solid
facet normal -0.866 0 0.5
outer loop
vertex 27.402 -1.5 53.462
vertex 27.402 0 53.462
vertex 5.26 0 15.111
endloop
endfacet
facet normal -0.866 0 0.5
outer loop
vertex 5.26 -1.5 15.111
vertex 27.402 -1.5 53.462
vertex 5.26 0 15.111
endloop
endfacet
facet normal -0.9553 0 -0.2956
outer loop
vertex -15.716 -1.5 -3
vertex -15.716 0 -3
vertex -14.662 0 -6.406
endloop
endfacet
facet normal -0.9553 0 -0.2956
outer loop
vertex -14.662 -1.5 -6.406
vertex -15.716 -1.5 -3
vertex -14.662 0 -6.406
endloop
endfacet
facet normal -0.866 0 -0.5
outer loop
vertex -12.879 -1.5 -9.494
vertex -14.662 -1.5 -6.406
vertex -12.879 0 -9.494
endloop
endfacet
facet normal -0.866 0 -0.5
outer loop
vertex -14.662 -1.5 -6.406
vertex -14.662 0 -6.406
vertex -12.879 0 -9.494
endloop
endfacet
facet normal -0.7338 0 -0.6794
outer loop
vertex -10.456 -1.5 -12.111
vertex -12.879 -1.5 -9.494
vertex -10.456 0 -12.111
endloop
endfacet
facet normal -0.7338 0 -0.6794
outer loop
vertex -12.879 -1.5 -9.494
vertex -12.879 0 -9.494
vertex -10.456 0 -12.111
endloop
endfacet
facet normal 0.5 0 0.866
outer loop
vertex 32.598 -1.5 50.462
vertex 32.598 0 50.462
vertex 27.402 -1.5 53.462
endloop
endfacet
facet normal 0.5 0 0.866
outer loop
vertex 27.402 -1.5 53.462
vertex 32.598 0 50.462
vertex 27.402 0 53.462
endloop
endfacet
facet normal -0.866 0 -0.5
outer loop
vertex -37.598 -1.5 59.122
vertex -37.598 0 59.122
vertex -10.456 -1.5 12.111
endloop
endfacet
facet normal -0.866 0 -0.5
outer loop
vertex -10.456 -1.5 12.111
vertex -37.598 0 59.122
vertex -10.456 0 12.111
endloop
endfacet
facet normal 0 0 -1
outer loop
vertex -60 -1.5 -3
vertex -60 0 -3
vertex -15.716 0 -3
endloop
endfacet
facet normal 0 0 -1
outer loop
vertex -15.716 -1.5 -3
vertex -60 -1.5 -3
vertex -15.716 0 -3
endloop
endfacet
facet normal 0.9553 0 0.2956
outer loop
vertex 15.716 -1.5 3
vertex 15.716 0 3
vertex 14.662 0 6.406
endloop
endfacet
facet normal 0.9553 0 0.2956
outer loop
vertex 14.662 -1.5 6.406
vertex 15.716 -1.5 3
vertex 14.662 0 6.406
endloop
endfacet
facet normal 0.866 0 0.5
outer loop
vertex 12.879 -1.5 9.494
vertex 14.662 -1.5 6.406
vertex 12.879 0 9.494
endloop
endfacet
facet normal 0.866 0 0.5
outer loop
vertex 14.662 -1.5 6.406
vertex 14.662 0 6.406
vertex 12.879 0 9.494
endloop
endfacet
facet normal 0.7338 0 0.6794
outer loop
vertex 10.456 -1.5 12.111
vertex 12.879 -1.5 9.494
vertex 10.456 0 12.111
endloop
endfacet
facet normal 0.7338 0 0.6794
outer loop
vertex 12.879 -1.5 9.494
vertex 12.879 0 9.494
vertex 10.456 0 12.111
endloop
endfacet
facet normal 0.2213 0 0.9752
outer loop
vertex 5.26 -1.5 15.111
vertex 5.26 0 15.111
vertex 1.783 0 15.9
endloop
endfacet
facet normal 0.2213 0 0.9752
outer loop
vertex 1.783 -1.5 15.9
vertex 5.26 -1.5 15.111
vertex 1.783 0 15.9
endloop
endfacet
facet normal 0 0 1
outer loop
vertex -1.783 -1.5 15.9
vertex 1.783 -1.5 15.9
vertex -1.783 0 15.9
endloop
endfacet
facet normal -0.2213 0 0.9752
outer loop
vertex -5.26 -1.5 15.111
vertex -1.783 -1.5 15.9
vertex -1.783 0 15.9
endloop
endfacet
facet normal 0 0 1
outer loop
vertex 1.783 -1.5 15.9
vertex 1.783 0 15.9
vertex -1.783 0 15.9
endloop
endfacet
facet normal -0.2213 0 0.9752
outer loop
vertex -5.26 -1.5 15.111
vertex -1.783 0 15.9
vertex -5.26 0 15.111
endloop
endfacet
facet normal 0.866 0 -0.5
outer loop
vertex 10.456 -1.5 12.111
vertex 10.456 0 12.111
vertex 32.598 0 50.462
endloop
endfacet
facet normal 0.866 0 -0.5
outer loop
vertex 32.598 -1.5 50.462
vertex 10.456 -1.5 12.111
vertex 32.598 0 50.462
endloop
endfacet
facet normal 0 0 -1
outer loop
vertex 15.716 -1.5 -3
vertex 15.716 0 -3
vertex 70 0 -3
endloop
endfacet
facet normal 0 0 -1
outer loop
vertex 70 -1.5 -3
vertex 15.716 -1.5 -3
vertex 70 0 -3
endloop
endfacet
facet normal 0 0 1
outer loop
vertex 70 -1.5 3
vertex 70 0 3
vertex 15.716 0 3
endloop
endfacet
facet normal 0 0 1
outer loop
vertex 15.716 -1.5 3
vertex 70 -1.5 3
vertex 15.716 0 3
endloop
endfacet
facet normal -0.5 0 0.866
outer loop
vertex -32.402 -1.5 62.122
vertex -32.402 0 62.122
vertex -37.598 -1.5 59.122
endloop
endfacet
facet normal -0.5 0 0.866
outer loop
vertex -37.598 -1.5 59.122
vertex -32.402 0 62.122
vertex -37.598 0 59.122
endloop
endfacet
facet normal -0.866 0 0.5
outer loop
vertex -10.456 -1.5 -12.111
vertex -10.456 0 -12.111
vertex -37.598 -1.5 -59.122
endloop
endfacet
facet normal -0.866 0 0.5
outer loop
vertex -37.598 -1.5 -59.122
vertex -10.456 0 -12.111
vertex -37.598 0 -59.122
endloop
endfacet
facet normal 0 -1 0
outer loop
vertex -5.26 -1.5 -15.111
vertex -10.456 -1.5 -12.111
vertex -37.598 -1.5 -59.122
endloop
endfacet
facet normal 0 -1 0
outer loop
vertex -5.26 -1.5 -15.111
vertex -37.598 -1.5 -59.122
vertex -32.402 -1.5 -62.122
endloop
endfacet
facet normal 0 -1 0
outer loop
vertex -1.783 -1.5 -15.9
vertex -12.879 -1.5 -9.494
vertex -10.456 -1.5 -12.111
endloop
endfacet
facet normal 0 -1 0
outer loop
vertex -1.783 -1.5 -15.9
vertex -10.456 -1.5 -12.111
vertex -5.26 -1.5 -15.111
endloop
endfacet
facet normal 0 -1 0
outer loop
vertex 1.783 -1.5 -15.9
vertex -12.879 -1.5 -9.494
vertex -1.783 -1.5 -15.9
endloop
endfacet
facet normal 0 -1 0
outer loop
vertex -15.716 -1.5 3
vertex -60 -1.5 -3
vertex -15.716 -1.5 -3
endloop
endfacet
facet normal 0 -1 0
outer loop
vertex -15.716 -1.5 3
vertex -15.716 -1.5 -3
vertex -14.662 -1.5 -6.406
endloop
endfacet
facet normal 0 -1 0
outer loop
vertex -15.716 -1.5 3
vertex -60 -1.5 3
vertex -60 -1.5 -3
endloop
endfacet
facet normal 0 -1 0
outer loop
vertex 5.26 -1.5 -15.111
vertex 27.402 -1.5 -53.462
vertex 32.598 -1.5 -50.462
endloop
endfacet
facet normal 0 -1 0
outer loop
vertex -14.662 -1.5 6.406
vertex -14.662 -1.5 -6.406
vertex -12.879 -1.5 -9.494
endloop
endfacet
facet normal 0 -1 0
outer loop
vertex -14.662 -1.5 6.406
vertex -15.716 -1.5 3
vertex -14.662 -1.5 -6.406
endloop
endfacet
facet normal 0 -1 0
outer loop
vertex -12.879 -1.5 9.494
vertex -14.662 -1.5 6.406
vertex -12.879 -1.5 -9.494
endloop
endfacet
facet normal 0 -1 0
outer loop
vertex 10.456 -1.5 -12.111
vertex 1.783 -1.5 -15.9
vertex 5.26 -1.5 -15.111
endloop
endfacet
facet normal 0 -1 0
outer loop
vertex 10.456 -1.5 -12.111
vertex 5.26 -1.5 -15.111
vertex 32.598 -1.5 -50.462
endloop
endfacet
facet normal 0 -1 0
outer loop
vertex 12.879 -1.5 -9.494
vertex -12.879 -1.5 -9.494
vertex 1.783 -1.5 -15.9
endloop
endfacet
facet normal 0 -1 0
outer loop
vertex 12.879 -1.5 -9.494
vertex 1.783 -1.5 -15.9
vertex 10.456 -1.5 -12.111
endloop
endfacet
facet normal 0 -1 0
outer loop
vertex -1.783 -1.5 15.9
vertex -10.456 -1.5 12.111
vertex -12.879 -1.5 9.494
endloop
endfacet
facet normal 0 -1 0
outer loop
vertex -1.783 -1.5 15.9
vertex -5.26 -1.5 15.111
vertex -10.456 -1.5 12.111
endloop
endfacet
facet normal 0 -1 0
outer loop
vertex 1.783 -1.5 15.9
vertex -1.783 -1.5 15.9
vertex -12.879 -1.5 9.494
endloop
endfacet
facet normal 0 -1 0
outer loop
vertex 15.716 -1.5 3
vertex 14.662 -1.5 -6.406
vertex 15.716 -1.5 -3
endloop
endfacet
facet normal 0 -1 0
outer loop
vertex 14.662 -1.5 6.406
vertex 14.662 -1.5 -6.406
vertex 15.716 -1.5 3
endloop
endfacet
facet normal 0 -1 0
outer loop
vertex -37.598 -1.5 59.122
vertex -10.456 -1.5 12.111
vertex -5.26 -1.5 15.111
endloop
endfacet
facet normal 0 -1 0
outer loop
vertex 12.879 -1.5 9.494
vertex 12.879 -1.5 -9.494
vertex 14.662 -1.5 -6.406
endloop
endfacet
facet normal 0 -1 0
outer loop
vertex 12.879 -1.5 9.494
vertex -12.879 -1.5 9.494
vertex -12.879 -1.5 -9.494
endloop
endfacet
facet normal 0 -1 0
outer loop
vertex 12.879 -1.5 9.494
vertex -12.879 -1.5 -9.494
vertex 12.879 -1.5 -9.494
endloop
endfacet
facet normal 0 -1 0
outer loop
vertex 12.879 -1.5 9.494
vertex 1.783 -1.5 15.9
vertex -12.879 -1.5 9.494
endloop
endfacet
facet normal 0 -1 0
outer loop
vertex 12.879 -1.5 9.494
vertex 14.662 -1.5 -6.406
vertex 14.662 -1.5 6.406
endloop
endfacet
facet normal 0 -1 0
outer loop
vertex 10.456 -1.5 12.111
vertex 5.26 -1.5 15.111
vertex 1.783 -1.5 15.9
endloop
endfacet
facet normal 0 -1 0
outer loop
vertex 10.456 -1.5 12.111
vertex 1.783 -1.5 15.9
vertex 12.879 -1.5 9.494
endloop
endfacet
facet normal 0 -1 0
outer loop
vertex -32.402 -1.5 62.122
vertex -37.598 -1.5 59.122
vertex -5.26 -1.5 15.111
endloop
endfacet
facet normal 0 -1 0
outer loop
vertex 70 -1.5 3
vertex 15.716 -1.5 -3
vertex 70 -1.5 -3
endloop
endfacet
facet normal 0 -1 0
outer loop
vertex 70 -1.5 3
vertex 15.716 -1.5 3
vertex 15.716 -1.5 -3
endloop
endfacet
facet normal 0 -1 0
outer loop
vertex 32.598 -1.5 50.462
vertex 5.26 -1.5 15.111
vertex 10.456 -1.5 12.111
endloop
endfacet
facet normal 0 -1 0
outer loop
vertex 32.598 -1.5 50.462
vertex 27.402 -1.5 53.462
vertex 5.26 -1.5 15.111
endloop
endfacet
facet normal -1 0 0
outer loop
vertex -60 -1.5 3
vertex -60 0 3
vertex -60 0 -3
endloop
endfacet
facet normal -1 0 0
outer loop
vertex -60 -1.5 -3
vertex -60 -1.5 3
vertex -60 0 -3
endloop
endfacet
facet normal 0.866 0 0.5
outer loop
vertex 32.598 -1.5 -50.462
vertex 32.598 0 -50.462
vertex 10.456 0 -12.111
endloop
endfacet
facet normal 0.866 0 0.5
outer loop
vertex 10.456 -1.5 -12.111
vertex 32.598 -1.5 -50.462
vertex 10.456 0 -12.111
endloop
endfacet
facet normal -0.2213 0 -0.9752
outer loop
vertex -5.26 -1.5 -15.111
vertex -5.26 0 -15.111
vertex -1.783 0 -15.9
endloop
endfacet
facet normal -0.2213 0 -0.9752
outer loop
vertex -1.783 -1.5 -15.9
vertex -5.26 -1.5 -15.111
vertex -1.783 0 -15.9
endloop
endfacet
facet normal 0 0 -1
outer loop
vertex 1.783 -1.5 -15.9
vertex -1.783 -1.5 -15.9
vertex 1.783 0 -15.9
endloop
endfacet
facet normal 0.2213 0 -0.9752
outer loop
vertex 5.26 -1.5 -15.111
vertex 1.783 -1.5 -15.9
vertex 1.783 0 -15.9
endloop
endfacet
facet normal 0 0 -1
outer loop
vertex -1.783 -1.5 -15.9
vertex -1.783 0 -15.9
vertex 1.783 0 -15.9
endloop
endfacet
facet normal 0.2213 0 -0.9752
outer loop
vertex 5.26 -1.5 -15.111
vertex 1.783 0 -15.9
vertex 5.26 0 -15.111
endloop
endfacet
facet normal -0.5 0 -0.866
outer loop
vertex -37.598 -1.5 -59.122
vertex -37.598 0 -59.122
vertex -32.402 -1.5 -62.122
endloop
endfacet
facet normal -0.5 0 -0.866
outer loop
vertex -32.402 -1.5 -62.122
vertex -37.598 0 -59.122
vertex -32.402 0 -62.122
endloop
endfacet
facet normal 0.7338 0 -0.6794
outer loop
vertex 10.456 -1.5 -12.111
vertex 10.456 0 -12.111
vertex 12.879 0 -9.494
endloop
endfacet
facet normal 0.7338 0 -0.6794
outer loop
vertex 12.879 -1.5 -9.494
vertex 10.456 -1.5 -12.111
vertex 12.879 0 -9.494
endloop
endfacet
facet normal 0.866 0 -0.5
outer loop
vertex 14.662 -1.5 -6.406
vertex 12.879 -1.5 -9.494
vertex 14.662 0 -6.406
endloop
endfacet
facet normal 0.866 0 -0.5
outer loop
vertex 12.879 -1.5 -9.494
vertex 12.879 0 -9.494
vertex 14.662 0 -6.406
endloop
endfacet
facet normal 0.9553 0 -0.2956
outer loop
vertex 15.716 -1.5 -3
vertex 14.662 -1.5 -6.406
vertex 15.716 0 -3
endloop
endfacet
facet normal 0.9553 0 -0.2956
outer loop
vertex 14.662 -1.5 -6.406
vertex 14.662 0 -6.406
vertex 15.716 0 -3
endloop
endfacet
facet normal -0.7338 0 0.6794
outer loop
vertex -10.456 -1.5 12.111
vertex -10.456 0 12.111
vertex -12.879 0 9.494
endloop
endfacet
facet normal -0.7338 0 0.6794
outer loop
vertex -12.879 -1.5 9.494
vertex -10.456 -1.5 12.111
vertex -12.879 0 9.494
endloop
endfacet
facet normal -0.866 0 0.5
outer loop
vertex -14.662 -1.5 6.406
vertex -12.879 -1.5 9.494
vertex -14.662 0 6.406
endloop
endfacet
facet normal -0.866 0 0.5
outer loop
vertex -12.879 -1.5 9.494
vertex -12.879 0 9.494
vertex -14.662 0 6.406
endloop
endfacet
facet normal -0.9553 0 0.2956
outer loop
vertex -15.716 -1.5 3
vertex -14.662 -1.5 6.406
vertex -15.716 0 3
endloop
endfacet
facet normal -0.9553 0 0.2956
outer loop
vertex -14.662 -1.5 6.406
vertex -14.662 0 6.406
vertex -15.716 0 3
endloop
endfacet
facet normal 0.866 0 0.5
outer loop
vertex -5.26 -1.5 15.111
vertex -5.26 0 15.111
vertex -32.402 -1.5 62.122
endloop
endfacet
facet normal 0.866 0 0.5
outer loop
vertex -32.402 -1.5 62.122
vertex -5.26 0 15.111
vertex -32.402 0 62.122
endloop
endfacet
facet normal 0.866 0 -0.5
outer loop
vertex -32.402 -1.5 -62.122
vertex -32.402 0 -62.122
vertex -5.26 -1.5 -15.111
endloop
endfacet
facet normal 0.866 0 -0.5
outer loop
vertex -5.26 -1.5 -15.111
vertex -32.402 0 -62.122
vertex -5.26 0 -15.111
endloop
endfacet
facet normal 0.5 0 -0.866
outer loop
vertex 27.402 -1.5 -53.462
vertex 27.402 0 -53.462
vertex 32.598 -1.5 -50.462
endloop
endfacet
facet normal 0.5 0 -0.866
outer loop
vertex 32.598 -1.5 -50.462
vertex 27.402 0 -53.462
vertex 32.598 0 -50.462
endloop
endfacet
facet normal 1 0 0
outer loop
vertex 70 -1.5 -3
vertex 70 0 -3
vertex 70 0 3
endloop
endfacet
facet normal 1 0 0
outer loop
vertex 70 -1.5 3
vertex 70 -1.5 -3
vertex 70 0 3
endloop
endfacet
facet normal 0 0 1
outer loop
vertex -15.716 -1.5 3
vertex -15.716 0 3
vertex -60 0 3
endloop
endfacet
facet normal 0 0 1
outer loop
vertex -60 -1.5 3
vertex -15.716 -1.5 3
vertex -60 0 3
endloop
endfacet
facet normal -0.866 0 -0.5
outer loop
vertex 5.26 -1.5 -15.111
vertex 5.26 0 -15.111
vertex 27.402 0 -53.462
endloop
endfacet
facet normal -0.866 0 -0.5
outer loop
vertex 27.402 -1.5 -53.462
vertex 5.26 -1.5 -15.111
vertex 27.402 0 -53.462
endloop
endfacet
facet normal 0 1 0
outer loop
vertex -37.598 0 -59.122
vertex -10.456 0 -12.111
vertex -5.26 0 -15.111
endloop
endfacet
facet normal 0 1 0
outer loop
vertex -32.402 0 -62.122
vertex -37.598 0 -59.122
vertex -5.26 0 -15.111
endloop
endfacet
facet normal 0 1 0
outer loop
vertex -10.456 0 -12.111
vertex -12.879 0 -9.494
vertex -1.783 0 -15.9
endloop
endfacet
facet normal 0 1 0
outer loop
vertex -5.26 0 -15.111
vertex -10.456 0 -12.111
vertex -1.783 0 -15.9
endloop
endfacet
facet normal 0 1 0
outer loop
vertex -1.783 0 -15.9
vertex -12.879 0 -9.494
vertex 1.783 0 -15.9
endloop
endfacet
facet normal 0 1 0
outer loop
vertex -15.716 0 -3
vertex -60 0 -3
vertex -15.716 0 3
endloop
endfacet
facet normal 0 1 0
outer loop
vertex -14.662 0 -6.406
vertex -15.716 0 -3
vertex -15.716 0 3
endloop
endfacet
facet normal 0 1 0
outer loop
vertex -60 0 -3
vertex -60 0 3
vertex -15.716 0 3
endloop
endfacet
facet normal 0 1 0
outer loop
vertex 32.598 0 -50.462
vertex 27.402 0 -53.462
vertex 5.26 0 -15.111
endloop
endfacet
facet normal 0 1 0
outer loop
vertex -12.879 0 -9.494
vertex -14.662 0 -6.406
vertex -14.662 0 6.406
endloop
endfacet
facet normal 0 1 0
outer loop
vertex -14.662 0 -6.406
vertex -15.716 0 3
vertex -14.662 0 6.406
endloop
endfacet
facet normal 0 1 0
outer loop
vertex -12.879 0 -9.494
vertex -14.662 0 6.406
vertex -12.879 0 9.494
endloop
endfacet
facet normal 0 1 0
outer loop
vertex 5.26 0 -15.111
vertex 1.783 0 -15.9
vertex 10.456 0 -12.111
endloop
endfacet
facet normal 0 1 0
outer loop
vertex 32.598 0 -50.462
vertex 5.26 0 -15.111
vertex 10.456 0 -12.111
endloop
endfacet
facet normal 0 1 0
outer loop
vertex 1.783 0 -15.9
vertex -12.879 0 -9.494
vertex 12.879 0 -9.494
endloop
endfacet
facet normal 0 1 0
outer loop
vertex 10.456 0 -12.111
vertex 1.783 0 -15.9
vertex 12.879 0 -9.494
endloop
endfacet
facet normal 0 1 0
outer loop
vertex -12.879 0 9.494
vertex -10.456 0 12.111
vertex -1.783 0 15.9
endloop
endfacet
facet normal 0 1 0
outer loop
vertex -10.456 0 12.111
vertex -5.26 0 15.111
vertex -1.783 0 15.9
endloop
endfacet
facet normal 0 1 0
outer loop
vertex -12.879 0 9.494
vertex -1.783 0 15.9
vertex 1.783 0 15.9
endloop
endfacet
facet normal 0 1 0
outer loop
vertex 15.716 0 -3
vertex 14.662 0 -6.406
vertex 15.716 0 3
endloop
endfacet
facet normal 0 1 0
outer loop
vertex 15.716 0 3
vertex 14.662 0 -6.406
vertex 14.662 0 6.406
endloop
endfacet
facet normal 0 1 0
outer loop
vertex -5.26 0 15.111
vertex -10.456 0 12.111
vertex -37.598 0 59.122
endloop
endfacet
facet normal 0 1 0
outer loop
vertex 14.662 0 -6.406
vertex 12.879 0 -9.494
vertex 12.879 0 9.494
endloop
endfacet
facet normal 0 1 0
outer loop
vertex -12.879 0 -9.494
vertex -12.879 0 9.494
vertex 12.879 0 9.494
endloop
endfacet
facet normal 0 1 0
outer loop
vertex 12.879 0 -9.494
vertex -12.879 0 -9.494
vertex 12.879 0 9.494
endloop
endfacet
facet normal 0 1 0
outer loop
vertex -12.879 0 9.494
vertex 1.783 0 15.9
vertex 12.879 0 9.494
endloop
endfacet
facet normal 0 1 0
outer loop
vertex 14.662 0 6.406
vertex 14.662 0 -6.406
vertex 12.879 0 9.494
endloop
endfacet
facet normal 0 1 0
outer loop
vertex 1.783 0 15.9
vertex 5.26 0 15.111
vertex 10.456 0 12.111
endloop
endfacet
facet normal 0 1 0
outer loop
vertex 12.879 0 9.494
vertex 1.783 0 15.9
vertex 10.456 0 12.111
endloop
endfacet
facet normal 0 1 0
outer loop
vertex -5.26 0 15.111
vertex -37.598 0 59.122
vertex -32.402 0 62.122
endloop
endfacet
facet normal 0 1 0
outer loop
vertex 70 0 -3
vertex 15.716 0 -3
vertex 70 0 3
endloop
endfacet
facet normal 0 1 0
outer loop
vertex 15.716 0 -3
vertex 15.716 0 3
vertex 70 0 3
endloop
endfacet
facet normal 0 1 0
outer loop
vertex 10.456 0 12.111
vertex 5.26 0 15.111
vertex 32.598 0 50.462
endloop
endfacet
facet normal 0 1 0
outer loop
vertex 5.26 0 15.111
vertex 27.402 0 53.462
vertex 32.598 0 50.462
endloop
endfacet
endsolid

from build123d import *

# Parameters (mm, degrees)
F1_DEPTH = 1.5


with BuildPart() as f1:
    # F0 (on Front) → F1 (new body)
    with BuildSketch(Plane.XZ):
        with BuildLine():
            Line((-60, -3), (-15.716234, -3))
            ThreePointArc((-15.716234, -3), (-13.856406, -8), (-10.456193, -12.110658))
            Line((-10.456193, -12.110658), (-37.598076, -59.121778))
            Line((-37.598076, -59.121778), (-32.401924, -62.121778))
            Line((-32.401924, -62.121778), (-5.260041, -15.110658))
            ThreePointArc((-5.260041, -15.110658), (0, -16), (5.260041, -15.110658))
            Line((5.260041, -15.110658), (27.401924, -53.461524))
            Line((27.401924, -53.461524), (32.598076, -50.461524))
            Line((32.598076, -50.461524), (10.456193, -12.110658))
            ThreePointArc((10.456193, -12.110658), (13.856406, -8), (15.716234, -3))
            Line((15.716234, -3), (70, -3))
            Line((70, -3), (70, 3))
            Line((70, 3), (15.716234, 3))
            ThreePointArc((15.716234, 3), (13.856406, 8), (10.456193, 12.110658))
            Line((10.456193, 12.110658), (32.598076, 50.461524))
            Line((32.598076, 50.461524), (27.401924, 53.461524))
            Line((27.401924, 53.461524), (5.260041, 15.110658))
            ThreePointArc((5.260041, 15.110658), (0, 16), (-5.260041, 15.110658))
            Line((-5.260041, 15.110658), (-32.401924, 62.121778))
            Line((-32.401924, 62.121778), (-37.598076, 59.121778))
            Line((-37.598076, 59.121778), (-10.456193, 12.110658))
            ThreePointArc((-10.456193, 12.110658), (-13.856406, 8), (-15.716234, 3))
            Line((-15.716234, 3), (-60, 3))
            Line((-60, 3), (-60, -3))
        make_face()
    extrude(amount=F1_DEPTH)


solid = f1.part
